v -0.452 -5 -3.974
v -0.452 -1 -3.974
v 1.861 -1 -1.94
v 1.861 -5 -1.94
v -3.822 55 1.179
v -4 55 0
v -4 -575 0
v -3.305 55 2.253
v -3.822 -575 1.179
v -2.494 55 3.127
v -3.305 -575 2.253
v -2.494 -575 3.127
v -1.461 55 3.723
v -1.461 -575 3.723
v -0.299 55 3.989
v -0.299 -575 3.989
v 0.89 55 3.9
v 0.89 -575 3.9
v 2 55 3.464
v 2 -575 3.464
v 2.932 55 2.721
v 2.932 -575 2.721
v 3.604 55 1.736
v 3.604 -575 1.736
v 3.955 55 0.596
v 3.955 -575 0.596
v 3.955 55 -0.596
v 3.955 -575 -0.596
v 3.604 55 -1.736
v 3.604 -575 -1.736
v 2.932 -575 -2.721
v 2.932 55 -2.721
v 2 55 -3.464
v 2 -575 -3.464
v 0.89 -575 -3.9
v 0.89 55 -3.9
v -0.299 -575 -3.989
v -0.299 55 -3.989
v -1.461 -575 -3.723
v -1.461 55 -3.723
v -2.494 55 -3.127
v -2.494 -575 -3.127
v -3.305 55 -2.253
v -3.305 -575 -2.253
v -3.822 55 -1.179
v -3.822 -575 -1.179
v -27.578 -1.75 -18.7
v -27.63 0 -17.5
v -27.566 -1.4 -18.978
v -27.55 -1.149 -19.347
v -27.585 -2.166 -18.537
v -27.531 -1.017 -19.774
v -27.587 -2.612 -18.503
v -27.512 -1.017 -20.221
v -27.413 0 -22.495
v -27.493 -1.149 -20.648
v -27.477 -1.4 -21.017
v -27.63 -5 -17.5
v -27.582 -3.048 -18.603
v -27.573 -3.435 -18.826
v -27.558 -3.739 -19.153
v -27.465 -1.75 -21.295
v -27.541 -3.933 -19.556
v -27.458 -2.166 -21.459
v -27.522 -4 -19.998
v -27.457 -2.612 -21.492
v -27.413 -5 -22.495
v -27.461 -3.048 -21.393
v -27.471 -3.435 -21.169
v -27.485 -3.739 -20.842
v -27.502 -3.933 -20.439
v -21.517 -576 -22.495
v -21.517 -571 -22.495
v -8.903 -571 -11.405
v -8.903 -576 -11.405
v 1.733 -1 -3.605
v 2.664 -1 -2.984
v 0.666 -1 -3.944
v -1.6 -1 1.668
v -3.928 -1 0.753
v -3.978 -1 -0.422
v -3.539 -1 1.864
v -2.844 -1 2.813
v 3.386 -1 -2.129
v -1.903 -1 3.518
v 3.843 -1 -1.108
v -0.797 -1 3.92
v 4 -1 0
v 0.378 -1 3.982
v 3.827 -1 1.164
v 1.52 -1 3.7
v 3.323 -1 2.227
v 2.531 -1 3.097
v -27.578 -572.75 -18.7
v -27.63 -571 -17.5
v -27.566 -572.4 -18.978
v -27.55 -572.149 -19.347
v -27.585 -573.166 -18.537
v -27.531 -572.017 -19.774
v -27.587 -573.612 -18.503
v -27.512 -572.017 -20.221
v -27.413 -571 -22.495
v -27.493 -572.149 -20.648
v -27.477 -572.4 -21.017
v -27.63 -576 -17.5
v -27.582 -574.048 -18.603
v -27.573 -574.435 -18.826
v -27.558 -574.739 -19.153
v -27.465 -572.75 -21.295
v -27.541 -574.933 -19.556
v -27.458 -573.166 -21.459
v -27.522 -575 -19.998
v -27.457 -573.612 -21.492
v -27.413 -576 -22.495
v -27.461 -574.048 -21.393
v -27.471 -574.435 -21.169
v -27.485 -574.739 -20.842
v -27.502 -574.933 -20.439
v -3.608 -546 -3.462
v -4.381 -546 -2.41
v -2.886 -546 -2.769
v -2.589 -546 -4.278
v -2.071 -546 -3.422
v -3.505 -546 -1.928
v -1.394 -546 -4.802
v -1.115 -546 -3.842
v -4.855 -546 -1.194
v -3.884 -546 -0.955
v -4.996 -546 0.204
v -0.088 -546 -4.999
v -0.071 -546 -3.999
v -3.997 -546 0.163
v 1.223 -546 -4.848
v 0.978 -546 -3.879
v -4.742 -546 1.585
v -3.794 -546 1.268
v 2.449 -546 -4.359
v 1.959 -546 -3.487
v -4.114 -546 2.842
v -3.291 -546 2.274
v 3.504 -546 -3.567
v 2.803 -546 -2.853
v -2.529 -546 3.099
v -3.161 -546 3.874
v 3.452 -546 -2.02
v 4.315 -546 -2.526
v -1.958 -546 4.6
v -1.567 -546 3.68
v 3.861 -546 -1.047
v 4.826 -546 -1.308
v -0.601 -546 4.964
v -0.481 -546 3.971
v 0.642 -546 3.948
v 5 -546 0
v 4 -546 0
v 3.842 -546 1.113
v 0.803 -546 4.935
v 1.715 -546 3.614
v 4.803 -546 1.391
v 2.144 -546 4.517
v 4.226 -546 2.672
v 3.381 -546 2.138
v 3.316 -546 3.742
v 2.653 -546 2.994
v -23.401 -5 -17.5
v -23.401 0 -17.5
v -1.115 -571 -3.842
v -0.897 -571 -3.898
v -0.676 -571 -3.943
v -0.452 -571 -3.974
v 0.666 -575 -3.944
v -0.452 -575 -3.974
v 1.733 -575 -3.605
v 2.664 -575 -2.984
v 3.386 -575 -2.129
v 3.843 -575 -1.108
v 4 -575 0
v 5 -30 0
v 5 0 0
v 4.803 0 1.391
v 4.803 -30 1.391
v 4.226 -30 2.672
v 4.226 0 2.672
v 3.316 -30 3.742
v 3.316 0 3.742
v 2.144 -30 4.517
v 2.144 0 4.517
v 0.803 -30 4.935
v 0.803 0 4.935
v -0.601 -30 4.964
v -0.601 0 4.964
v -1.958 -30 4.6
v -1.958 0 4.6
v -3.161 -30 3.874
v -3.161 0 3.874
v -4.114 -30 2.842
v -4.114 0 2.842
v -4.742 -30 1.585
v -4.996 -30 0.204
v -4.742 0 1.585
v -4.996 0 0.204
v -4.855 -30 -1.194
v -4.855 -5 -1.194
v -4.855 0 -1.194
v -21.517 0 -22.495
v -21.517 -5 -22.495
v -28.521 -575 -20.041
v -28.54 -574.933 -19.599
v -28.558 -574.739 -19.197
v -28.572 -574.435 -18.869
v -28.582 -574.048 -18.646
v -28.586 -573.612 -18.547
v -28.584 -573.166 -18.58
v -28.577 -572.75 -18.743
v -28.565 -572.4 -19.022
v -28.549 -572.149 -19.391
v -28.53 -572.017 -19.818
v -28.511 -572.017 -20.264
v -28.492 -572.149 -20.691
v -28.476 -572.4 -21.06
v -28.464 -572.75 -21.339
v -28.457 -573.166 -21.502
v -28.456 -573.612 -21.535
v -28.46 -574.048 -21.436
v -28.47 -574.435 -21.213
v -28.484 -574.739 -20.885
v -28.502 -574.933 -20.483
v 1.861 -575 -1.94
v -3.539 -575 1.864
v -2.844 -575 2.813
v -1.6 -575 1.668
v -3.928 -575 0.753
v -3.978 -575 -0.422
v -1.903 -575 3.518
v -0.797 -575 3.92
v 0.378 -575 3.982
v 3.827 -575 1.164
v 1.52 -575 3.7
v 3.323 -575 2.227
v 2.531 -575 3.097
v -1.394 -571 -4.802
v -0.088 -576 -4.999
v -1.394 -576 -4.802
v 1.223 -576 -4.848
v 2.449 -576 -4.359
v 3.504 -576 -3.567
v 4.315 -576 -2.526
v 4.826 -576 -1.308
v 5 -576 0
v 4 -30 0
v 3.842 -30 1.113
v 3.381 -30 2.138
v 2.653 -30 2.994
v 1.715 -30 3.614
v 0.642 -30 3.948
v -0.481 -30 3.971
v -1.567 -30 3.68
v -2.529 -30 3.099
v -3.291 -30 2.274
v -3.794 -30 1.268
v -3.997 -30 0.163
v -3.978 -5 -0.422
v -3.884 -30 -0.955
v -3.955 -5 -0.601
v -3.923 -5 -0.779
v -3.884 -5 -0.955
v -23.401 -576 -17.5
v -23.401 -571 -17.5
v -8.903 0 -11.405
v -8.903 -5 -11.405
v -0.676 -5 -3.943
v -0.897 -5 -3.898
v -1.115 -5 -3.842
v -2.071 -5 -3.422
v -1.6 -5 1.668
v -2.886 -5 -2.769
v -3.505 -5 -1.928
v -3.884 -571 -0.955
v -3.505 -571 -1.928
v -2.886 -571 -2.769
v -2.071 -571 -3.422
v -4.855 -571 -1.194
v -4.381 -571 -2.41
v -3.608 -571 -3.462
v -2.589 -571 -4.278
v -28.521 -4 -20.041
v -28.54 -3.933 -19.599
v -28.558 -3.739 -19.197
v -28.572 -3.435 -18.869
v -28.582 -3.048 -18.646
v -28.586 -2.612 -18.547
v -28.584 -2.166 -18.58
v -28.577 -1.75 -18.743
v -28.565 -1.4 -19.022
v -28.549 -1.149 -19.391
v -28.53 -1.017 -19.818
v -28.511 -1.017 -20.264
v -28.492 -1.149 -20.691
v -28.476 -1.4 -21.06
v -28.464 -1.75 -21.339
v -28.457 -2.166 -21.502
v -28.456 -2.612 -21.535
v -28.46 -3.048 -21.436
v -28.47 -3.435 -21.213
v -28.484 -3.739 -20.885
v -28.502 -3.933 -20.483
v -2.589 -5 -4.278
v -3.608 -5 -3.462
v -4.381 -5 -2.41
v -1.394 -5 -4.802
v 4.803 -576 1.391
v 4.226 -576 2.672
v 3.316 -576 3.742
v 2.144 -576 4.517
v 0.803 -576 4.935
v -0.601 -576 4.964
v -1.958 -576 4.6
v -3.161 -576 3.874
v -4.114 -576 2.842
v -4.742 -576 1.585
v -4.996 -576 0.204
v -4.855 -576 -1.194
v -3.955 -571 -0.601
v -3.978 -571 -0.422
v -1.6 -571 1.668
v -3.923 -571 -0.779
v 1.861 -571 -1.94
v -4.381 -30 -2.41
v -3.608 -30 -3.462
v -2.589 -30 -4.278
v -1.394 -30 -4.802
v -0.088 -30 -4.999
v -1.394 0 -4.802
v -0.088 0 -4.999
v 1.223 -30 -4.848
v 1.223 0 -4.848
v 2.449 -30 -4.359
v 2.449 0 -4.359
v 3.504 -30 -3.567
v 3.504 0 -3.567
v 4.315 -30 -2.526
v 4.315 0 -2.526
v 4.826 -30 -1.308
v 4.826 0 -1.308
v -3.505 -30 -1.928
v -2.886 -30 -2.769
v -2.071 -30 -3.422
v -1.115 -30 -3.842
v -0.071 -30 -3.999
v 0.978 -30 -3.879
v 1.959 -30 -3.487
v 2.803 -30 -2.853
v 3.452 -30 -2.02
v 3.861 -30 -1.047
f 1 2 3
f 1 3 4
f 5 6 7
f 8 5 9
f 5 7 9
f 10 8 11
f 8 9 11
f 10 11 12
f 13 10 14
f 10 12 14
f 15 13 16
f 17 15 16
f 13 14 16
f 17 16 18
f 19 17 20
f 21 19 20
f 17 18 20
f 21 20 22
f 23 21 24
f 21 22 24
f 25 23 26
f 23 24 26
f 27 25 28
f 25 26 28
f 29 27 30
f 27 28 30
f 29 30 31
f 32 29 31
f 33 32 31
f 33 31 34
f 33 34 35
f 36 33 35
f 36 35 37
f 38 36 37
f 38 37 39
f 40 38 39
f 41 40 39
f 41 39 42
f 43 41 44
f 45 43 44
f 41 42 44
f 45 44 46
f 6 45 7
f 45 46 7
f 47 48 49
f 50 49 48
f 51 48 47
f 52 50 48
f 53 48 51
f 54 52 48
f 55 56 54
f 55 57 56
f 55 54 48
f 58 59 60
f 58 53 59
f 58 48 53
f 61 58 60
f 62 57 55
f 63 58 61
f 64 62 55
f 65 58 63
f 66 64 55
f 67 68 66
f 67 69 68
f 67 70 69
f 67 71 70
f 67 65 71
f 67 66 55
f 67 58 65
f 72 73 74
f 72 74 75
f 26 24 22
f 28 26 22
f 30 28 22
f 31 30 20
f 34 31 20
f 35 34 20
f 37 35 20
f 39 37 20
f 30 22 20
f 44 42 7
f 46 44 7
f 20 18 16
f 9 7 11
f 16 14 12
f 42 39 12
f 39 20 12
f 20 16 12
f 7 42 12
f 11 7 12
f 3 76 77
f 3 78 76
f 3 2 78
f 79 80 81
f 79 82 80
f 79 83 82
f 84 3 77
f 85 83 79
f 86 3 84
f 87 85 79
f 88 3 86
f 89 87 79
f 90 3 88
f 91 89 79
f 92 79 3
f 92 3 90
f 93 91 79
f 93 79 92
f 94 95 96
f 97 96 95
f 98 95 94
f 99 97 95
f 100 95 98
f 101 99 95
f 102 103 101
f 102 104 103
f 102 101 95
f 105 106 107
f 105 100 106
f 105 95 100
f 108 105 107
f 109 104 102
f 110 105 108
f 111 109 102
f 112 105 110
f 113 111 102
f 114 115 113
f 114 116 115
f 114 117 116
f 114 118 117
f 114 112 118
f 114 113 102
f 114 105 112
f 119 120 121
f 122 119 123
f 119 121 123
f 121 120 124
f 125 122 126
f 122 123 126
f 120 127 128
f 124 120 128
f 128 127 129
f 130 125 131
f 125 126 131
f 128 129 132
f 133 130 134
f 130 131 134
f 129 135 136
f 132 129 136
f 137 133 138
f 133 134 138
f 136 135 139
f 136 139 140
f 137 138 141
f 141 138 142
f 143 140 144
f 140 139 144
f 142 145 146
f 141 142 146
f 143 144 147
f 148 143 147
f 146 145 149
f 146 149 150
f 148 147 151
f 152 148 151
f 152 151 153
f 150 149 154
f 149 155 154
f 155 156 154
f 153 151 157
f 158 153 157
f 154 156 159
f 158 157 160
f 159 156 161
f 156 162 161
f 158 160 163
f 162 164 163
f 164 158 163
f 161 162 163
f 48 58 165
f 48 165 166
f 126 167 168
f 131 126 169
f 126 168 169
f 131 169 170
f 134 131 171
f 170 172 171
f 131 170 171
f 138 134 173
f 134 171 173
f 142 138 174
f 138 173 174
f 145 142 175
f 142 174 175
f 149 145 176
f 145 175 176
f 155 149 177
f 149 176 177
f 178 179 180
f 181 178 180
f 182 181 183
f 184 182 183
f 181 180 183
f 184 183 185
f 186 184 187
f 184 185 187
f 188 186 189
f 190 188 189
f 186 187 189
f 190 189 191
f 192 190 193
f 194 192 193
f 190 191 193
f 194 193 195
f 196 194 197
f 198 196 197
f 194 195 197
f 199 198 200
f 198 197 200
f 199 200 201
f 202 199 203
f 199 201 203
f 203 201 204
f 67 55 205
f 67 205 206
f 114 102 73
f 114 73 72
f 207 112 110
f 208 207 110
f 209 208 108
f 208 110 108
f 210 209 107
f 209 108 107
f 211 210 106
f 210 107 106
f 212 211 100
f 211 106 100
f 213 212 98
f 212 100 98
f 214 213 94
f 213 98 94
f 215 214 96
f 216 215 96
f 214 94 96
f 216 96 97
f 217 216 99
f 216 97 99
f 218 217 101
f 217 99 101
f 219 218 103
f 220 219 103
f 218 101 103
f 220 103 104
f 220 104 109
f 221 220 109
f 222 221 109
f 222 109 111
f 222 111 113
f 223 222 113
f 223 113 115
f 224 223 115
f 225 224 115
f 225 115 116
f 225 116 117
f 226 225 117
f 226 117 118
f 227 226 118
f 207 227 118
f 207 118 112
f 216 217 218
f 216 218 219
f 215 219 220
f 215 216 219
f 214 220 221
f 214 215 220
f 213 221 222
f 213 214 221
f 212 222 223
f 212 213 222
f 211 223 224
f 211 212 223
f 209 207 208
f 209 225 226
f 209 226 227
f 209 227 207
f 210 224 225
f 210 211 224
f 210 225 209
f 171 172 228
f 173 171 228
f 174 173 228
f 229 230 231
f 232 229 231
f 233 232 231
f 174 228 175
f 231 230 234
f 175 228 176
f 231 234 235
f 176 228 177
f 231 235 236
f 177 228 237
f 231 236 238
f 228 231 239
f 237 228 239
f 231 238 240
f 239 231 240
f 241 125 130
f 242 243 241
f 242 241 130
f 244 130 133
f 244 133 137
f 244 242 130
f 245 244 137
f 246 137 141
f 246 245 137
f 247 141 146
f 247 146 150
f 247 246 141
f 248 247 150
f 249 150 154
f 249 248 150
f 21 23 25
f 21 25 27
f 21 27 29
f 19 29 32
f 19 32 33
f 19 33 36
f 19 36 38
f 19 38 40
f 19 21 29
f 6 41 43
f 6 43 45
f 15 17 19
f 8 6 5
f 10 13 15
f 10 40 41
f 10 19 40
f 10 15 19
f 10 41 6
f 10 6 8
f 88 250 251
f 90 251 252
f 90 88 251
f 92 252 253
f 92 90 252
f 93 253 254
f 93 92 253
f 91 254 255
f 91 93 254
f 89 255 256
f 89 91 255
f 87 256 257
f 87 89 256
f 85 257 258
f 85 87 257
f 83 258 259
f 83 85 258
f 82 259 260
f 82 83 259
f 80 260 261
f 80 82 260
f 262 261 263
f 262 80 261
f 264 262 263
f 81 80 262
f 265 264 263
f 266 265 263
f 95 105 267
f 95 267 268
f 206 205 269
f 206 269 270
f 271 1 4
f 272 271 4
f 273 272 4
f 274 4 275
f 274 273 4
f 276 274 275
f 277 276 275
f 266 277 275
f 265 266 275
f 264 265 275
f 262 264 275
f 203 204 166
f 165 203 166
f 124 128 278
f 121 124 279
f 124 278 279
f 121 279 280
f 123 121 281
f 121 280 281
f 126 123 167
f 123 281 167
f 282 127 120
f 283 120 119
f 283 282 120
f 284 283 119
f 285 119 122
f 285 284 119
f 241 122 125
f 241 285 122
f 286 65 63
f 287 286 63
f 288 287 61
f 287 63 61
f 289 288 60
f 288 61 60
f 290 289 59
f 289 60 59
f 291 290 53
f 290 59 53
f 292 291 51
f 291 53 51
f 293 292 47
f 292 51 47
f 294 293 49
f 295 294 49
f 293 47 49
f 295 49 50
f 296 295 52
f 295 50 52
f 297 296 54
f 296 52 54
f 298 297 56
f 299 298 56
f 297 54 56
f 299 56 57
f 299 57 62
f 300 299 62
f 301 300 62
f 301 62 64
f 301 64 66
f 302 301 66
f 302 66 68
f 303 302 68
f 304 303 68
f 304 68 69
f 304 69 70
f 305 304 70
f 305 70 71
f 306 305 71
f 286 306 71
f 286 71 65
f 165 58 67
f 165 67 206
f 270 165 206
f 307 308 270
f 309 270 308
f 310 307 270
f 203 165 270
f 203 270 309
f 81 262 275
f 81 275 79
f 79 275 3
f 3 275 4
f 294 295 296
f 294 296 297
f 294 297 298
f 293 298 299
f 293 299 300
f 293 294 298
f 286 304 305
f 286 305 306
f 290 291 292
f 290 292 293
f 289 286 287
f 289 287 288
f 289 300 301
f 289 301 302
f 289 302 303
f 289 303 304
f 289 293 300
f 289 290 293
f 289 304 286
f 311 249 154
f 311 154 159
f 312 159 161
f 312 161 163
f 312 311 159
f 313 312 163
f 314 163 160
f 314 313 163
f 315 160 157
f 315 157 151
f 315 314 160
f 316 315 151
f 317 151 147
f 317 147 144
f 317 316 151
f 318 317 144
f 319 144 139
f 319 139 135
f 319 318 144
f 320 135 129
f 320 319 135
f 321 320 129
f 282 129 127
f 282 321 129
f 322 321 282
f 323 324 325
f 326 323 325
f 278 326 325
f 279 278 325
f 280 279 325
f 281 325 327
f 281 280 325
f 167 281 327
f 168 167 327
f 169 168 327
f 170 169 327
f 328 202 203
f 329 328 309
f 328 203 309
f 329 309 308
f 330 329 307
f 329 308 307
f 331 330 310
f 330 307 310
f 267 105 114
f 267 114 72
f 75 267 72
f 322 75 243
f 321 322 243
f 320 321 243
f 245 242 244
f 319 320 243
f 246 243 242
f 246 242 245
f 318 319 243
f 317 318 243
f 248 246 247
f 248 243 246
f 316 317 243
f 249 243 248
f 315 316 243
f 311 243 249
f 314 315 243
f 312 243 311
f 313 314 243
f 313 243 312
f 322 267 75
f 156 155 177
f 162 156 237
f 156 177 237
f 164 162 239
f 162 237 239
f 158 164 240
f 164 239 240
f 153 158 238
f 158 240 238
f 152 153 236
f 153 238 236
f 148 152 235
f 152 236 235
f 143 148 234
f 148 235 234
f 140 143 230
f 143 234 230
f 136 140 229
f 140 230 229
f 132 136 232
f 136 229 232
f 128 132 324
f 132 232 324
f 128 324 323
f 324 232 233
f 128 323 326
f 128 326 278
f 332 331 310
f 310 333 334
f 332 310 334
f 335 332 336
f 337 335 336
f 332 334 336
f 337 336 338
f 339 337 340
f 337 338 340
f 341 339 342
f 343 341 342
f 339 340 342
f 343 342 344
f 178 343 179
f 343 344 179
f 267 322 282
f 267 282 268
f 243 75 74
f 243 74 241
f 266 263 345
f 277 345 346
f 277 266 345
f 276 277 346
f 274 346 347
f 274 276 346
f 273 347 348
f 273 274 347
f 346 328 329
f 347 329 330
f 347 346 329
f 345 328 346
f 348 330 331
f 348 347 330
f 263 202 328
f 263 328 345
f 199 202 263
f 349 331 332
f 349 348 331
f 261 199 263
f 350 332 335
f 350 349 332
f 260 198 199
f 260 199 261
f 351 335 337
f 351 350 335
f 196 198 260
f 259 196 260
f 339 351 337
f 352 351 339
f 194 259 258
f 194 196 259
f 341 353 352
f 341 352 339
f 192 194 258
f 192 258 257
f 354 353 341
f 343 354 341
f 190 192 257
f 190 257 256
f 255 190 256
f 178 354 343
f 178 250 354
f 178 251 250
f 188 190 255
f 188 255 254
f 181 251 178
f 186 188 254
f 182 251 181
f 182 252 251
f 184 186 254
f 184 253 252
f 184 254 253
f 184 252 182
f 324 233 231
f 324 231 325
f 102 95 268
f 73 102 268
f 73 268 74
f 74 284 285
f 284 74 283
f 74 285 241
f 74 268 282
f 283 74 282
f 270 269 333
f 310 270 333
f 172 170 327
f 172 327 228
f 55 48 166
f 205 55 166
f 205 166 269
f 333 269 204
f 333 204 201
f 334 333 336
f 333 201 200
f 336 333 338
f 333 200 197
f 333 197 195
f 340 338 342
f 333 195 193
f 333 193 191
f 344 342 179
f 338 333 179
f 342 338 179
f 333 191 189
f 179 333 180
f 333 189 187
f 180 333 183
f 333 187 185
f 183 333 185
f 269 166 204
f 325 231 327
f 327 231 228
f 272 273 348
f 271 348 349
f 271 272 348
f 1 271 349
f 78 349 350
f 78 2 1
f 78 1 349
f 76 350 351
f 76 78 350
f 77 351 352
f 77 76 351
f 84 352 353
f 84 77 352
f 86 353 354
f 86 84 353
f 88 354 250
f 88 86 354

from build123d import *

# Parameters (mm, degrees)
F2_DEPTH  = 30
F3_DEPTH  = 5
F5_DEPTH  = 30
F6_DEPTH  = 5
F7_T      = -1
F8_T      = -1
F9_R      = 4
F10_DEPTH = 630
F6_FACE_W = 5
F6_FACE_H = 5
F3_FACE_W = 5
F3_FACE_H = 5
F14_R     = 1.5
F15_DEPTH = 3
F16_R     = 1.5
F17_DEPTH = 3
F18_DEPTH = 4
F19_DEPTH = 4


with BuildPart() as f2:
    # F1 (on Front) → F2 (new body)
    with BuildSketch(Plane.XZ):
        with BuildLine():
            ThreePointArc((-1.3935307675, -4.801882131), (3.0026943037, -3.9979778537), (5, 0))
            ThreePointArc((5, 0), (-0.6014206199, 4.9636975369), (-4.8553172952, -1.1941080199))
            ThreePointArc((-4.8553172952, -1.1941080199), (-3.6077741111, -3.4617865277), (-1.3935307675, -4.801882131))
        make_face()
    extrude(amount=F2_DEPTH)

    # F1 (on Front) → F3 (join)
    with BuildSketch(Plane.XZ):
        with BuildLine():
            ThreePointArc((-1.3935307675, -4.801882131), (-3.6077741111, -3.4617865277), (-4.8553172952, -1.1941080199))
            Line((-4.8553172952, -1.1941080199), (-12.3652843317, -7.7971675463))
            Line((-12.3652843317, -7.7971675463), (-8.903497804, -11.4049416575))
            Line((-8.903497804, -11.4049416575), (-1.3935307675, -4.801882131))
        make_face()
    extrude(amount=F3_DEPTH)

    # F8
    f8_openings = [f2.faces().sort_by_distance(p)[0] for p in [
        (0, -30, 0),
    ]]
    offset(amount=F8_T, openings=f8_openings)

    # F13: sweep along a path in F11
    with BuildLine(Plane.XZ.offset(576)) as f13_path:
        Line((0, 0), (-22.5299011097, -19.8091785794))
        Line((-22.5299011097, -19.8091785794), (-27.5299011097, -19.8091785794))
    # F3_face (on face) → F13 (sweep)
    with BuildSketch(Plane(origin=(-10.6343910679, -2.5, -9.6010546019), x_dir=(0, -1, 0), z_dir=(-0.7215548222, 0, -0.6923573055))):
        Rectangle(F3_FACE_W, F3_FACE_H)
    sweep(path=f13_path.line, transition=Transition.RIGHT)

    # F16 (on face) → F17 (cut)
    with BuildSketch(Plane(origin=(-28.3388841018, 0, -1.234225183), x_dir=(0, -1, 0), z_dir=(-0.9990529432, 0, -0.0435111099))):
        with Locations((2.5, -18.7811488439)):
            Circle(F16_R)
    extrude(amount=-F17_DEPTH, mode=Mode.SUBTRACT)

    # F18 (add): a face of the model
    f18_faces = [f2.faces().sort_by_distance(p)[0] for p in [
        (-24.5245366401, -2.5, -19.8670538823),
    ]]
    extrude(f18_faces, amount=F18_DEPTH)


with BuildPart() as f5:
    # F4 (on offset) → F5 (new body)
    with BuildSketch(Plane.XZ.offset(576)):
        with BuildLine():
            ThreePointArc((-1.3935307675, -4.801882131), (3.0026943037, -3.9979778537), (5, 0))
            ThreePointArc((5, 0), (-0.6014206199, 4.9636975369), (-4.8553172952, -1.1941080199))
            ThreePointArc((-4.8553172952, -1.1941080199), (-3.6077741111, -3.4617865277), (-1.3935307675, -4.801882131))
        make_face()
    extrude(amount=-F5_DEPTH)

    # F4 (on offset) → F6 (join)
    with BuildSketch(Plane.XZ.offset(576)):
        with BuildLine():
            ThreePointArc((-1.3935307675, -4.801882131), (-3.6077741111, -3.4617865277), (-4.8553172952, -1.1941080199))
            Line((-4.8553172952, -1.1941080199), (-12.3652843317, -7.7971675463))
            Line((-12.3652843317, -7.7971675463), (-8.903497804, -11.4049416575))
            Line((-8.903497804, -11.4049416575), (-1.3935307675, -4.801882131))
        make_face()
    extrude(amount=-F6_DEPTH)

    # F7
    f7_openings = [f5.faces().sort_by_distance(p)[0] for p in [
        (0, -546, 0),
    ]]
    offset(amount=F7_T, openings=f7_openings)

    # F12: sweep along a path in F11
    with BuildLine(Plane.XZ.offset(576)) as f12_path:
        Line((0, 0), (-22.5299011097, -19.8091785794))
        Line((-22.5299011097, -19.8091785794), (-27.5299011097, -19.8091785794))
    # F6_face (on face) → F12 (sweep)
    with BuildSketch(Plane(origin=(-10.6343910679, -573.5, -9.6010546019), x_dir=(0, -1, 0), z_dir=(-0.7215548222, 0, -0.6923573055))):
        Rectangle(F6_FACE_W, F6_FACE_H)
    sweep(path=f12_path.line, transition=Transition.RIGHT)

    # F14 (on face) → F15 (cut)
    with BuildSketch(Plane(origin=(-28.3388841018, 0, -1.234225183), x_dir=(0, -1, 0), z_dir=(-0.9990529432, 0, -0.0435111099))):
        with Locations((573.5, -18.7811488439)):
            Circle(F14_R)
    extrude(amount=-F15_DEPTH, mode=Mode.SUBTRACT)

    # F19 (add): a face of the model
    f19_faces = [f5.faces().sort_by_distance(p)[0] for p in [
        (-24.5245366401, -573.5, -19.8670538823),
    ]]
    extrude(f19_faces, amount=F19_DEPTH)


with BuildPart() as f10:
    # F9 (on face) → F10 (new body)
    with BuildSketch(Plane(origin=(0, -575, 0), x_dir=(-1, 0, 0), z_dir=(0, 1, 0))):
        Circle(F9_R)
    extrude(amount=F10_DEPTH)


solid = Compound([f2.part, f5.part, f10.part])
